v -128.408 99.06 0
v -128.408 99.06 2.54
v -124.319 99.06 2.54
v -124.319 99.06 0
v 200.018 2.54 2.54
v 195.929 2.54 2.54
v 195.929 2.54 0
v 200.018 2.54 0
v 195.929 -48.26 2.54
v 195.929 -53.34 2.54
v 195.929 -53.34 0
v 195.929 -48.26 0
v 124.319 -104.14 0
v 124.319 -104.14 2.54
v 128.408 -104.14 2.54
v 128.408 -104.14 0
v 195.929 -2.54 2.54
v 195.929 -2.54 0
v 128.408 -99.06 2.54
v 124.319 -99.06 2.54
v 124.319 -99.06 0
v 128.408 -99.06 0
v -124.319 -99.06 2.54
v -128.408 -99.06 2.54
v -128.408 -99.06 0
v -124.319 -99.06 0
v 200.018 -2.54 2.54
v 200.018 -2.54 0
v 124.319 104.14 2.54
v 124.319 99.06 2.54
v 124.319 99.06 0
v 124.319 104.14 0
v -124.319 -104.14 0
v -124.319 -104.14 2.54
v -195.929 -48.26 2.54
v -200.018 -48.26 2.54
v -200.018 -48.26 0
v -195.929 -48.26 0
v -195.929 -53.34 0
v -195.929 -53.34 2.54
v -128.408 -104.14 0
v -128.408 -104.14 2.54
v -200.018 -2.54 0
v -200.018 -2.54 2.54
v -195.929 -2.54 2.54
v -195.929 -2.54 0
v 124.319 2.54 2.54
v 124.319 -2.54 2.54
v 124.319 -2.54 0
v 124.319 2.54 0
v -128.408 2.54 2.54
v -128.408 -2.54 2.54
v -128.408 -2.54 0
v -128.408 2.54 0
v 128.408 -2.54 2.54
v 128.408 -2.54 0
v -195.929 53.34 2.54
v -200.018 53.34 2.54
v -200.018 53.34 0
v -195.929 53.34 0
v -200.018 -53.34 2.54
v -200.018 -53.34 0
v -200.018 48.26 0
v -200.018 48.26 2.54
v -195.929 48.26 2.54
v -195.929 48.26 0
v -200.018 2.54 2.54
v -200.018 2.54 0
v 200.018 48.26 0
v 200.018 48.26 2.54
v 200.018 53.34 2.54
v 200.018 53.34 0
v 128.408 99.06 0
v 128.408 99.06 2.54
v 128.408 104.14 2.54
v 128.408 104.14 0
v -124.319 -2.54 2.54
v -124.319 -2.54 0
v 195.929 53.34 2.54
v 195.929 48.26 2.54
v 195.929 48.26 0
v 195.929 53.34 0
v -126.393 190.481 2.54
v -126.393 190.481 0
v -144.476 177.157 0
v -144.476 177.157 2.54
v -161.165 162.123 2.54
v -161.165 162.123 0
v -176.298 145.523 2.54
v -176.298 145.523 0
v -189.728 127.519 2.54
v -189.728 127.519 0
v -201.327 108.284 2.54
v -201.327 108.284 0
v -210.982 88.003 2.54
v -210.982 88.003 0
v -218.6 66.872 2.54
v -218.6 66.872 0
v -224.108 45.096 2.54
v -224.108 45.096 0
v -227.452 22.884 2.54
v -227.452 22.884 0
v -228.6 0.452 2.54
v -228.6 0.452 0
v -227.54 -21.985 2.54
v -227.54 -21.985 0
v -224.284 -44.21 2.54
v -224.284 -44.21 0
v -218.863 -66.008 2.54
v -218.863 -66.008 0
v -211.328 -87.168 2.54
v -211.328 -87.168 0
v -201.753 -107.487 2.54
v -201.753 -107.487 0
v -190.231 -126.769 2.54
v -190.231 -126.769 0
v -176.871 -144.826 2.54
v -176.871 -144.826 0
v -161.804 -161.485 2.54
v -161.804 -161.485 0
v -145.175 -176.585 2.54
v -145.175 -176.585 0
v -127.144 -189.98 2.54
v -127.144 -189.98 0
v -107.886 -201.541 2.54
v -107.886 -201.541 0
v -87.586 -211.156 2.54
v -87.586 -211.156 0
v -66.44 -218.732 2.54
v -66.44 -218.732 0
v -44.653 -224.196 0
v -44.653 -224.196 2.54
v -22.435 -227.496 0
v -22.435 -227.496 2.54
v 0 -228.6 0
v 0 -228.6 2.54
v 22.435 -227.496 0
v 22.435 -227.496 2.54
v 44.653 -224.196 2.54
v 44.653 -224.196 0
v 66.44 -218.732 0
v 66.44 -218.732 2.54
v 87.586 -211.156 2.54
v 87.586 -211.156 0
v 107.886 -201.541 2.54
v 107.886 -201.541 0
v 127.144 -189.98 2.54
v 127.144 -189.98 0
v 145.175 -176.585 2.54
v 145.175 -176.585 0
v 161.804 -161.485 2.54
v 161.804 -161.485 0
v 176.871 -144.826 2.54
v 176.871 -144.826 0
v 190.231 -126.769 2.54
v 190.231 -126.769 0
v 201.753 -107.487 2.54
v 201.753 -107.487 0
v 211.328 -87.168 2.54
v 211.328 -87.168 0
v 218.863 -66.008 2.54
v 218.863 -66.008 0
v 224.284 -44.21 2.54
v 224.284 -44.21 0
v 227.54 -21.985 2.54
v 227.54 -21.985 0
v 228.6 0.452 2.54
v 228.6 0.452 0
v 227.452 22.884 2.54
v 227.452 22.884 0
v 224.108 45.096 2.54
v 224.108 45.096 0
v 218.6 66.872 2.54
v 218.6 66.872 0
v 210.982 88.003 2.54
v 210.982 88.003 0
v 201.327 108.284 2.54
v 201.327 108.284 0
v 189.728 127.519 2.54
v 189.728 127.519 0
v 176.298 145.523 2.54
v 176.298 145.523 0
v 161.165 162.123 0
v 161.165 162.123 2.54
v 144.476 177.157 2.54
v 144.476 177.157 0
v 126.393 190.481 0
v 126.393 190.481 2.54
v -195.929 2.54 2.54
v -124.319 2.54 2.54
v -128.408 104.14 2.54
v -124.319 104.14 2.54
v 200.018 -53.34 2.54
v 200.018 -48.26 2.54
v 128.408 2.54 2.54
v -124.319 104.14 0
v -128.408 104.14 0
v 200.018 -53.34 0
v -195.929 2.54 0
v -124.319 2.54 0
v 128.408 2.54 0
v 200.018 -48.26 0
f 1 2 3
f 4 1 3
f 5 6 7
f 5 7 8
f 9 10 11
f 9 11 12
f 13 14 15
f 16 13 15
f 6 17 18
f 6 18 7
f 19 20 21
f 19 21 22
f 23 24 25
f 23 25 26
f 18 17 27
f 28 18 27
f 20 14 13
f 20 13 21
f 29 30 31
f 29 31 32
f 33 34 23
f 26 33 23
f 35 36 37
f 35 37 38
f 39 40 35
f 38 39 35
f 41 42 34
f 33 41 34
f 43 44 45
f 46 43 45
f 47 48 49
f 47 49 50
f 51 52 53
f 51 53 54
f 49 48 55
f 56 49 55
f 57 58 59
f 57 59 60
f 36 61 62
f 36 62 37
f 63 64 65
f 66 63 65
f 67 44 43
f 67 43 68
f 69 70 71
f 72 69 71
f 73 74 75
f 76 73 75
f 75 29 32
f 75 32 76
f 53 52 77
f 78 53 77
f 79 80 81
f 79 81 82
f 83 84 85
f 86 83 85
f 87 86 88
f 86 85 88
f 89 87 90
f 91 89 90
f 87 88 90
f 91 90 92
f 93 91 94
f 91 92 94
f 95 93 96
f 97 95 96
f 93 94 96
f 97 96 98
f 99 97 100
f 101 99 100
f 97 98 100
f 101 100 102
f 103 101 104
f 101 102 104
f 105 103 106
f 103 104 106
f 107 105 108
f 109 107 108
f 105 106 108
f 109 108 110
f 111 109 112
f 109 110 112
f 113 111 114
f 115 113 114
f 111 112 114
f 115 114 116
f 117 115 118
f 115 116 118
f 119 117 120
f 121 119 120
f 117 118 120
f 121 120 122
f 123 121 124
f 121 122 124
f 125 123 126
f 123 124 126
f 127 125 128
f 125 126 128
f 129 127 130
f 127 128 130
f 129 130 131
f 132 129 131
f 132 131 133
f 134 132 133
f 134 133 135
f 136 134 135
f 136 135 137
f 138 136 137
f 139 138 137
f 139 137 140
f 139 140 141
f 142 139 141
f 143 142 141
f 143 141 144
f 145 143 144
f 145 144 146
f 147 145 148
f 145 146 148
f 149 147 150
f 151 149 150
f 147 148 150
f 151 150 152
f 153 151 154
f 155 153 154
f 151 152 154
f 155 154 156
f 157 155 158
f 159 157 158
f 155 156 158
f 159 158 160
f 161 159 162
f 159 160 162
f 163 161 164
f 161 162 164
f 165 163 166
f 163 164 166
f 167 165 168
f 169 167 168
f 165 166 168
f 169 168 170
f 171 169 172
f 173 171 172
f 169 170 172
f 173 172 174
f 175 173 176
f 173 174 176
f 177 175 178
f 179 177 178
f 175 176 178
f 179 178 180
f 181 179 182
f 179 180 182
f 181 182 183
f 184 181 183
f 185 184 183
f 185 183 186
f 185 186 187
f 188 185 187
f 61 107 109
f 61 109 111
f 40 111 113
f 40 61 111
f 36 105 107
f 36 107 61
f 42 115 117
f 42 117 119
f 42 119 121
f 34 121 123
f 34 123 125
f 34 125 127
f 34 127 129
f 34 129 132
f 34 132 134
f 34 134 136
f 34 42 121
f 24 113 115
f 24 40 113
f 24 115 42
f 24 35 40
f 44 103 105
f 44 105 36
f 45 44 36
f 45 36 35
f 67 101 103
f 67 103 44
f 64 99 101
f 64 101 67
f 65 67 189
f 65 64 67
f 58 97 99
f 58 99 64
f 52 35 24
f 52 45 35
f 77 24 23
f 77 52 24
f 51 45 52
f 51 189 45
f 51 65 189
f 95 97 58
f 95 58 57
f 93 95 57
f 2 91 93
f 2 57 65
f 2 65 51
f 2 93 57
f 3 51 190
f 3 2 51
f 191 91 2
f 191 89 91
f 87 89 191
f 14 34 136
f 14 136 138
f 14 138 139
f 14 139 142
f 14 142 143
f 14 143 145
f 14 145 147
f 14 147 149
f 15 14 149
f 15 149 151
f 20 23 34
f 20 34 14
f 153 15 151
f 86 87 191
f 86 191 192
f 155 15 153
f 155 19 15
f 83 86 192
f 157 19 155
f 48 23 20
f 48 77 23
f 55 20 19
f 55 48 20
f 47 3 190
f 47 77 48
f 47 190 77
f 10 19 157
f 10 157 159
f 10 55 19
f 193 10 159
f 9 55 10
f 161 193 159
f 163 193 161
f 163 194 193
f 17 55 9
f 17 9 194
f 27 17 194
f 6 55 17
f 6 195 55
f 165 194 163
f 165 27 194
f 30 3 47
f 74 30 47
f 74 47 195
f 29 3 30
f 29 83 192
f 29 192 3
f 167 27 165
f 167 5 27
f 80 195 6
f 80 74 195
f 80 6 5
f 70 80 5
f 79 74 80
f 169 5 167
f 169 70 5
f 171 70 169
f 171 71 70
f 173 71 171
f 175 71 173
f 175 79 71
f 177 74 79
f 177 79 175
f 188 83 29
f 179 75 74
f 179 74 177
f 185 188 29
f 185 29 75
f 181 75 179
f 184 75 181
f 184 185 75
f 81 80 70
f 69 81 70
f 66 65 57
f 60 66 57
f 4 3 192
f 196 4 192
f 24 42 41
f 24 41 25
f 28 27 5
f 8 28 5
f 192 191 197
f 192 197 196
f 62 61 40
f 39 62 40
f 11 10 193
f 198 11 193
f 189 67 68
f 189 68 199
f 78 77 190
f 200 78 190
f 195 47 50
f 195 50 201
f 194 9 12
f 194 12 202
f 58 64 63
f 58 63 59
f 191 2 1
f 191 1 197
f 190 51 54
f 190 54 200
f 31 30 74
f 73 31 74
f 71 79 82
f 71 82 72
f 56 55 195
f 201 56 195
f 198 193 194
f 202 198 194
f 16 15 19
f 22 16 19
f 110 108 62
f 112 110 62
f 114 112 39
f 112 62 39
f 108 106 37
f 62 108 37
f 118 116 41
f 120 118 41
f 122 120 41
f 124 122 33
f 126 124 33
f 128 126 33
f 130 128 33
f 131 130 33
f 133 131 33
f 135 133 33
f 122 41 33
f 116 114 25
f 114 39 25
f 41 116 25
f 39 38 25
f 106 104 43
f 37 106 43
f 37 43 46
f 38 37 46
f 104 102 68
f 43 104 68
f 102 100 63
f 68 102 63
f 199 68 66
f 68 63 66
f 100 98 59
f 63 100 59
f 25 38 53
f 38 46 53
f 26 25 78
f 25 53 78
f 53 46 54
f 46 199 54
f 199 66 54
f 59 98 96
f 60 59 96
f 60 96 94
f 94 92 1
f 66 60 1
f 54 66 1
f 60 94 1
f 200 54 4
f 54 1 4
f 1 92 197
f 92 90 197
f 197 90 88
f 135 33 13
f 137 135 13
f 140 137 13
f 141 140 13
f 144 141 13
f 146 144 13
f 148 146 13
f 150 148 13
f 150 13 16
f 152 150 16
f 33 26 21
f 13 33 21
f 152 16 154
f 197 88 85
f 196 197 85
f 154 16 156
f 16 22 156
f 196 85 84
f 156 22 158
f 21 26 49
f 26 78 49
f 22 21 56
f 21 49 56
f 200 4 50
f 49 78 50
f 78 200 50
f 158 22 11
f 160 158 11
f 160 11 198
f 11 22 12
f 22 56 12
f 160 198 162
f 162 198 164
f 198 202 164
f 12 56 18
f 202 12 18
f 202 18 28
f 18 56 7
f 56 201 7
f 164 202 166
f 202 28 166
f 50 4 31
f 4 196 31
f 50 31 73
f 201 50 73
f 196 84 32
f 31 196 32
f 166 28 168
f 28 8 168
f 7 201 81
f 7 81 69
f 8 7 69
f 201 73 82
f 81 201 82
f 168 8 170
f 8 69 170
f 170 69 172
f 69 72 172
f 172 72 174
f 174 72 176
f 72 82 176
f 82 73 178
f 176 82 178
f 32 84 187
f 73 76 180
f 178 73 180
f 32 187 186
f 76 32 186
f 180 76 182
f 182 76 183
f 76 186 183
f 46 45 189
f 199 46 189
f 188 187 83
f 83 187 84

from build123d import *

# Parameters (mm, degrees)
F1_DEPTH = 2.54
F2_W     = 4.0894
F2_H     = 5.08
F3_DEPTH = 25.4
F4_DEPTH = 25.4


with BuildPart() as f1:
    # F0 (on Top) → F1 (new body)
    with BuildSketch(Plane.XY):
        with BuildLine():
            Line((126.392629, 190.480612), (-126.392629, 190.480612))
            ThreePointArc((-126.392629, 190.480612), (0, -228.6), (126.392629, 190.480612))
        make_face()
    extrude(amount=F1_DEPTH)

    # F2 (on face) → F3 (cut)
    with BuildSketch(Plane.XY.offset(2.54)):
        with Locations((-197.973407, 0)):
            Rectangle(F2_W, F2_H)
        with Locations((-126.363405, 0)):
            Rectangle(F2_W, F2_H)
        with Locations((-197.973407, 50.8)):
            Rectangle(F2_W, F2_H)
        with Locations((-197.973407, -50.8)):
            Rectangle(F2_W, F2_H)
        with Locations((-126.363405, 101.6)):
            Rectangle(F2_W, F2_H)
        with Locations((-126.363405, -101.6)):
            Rectangle(F2_W, F2_H)
        with Locations((197.973407, 0)):
            Rectangle(F2_W, F2_H)
        with Locations((197.973407, -50.8)):
            Rectangle(F2_W, F2_H)
        with Locations((197.973407, 50.8)):
            Rectangle(F2_W, F2_H)
        with Locations((126.363405, 0)):
            Rectangle(F2_W, F2_H)
        with Locations((126.363405, -101.6)):
            Rectangle(F2_W, F2_H)
        with Locations((126.363405, 101.6)):
            Rectangle(F2_W, F2_H)
    extrude(amount=-F3_DEPTH, mode=Mode.SUBTRACT)

    # F2 (on face) → F4 (cut)
    with BuildSketch(Plane.XY.offset(2.54)):
        with Locations((126.363405, 101.6)):
            Rectangle(F2_W, F2_H)
        with Locations((197.973407, 50.8)):
            Rectangle(F2_W, F2_H)
        with Locations((126.363405, 0)):
            Rectangle(F2_W, F2_H)
        with Locations((197.973407, 0)):
            Rectangle(F2_W, F2_H)
        with Locations((197.973407, -50.8)):
            Rectangle(F2_W, F2_H)
        with Locations((126.363405, -101.6)):
            Rectangle(F2_W, F2_H)
    extrude(amount=-F4_DEPTH, mode=Mode.SUBTRACT)


solid = f1.part
